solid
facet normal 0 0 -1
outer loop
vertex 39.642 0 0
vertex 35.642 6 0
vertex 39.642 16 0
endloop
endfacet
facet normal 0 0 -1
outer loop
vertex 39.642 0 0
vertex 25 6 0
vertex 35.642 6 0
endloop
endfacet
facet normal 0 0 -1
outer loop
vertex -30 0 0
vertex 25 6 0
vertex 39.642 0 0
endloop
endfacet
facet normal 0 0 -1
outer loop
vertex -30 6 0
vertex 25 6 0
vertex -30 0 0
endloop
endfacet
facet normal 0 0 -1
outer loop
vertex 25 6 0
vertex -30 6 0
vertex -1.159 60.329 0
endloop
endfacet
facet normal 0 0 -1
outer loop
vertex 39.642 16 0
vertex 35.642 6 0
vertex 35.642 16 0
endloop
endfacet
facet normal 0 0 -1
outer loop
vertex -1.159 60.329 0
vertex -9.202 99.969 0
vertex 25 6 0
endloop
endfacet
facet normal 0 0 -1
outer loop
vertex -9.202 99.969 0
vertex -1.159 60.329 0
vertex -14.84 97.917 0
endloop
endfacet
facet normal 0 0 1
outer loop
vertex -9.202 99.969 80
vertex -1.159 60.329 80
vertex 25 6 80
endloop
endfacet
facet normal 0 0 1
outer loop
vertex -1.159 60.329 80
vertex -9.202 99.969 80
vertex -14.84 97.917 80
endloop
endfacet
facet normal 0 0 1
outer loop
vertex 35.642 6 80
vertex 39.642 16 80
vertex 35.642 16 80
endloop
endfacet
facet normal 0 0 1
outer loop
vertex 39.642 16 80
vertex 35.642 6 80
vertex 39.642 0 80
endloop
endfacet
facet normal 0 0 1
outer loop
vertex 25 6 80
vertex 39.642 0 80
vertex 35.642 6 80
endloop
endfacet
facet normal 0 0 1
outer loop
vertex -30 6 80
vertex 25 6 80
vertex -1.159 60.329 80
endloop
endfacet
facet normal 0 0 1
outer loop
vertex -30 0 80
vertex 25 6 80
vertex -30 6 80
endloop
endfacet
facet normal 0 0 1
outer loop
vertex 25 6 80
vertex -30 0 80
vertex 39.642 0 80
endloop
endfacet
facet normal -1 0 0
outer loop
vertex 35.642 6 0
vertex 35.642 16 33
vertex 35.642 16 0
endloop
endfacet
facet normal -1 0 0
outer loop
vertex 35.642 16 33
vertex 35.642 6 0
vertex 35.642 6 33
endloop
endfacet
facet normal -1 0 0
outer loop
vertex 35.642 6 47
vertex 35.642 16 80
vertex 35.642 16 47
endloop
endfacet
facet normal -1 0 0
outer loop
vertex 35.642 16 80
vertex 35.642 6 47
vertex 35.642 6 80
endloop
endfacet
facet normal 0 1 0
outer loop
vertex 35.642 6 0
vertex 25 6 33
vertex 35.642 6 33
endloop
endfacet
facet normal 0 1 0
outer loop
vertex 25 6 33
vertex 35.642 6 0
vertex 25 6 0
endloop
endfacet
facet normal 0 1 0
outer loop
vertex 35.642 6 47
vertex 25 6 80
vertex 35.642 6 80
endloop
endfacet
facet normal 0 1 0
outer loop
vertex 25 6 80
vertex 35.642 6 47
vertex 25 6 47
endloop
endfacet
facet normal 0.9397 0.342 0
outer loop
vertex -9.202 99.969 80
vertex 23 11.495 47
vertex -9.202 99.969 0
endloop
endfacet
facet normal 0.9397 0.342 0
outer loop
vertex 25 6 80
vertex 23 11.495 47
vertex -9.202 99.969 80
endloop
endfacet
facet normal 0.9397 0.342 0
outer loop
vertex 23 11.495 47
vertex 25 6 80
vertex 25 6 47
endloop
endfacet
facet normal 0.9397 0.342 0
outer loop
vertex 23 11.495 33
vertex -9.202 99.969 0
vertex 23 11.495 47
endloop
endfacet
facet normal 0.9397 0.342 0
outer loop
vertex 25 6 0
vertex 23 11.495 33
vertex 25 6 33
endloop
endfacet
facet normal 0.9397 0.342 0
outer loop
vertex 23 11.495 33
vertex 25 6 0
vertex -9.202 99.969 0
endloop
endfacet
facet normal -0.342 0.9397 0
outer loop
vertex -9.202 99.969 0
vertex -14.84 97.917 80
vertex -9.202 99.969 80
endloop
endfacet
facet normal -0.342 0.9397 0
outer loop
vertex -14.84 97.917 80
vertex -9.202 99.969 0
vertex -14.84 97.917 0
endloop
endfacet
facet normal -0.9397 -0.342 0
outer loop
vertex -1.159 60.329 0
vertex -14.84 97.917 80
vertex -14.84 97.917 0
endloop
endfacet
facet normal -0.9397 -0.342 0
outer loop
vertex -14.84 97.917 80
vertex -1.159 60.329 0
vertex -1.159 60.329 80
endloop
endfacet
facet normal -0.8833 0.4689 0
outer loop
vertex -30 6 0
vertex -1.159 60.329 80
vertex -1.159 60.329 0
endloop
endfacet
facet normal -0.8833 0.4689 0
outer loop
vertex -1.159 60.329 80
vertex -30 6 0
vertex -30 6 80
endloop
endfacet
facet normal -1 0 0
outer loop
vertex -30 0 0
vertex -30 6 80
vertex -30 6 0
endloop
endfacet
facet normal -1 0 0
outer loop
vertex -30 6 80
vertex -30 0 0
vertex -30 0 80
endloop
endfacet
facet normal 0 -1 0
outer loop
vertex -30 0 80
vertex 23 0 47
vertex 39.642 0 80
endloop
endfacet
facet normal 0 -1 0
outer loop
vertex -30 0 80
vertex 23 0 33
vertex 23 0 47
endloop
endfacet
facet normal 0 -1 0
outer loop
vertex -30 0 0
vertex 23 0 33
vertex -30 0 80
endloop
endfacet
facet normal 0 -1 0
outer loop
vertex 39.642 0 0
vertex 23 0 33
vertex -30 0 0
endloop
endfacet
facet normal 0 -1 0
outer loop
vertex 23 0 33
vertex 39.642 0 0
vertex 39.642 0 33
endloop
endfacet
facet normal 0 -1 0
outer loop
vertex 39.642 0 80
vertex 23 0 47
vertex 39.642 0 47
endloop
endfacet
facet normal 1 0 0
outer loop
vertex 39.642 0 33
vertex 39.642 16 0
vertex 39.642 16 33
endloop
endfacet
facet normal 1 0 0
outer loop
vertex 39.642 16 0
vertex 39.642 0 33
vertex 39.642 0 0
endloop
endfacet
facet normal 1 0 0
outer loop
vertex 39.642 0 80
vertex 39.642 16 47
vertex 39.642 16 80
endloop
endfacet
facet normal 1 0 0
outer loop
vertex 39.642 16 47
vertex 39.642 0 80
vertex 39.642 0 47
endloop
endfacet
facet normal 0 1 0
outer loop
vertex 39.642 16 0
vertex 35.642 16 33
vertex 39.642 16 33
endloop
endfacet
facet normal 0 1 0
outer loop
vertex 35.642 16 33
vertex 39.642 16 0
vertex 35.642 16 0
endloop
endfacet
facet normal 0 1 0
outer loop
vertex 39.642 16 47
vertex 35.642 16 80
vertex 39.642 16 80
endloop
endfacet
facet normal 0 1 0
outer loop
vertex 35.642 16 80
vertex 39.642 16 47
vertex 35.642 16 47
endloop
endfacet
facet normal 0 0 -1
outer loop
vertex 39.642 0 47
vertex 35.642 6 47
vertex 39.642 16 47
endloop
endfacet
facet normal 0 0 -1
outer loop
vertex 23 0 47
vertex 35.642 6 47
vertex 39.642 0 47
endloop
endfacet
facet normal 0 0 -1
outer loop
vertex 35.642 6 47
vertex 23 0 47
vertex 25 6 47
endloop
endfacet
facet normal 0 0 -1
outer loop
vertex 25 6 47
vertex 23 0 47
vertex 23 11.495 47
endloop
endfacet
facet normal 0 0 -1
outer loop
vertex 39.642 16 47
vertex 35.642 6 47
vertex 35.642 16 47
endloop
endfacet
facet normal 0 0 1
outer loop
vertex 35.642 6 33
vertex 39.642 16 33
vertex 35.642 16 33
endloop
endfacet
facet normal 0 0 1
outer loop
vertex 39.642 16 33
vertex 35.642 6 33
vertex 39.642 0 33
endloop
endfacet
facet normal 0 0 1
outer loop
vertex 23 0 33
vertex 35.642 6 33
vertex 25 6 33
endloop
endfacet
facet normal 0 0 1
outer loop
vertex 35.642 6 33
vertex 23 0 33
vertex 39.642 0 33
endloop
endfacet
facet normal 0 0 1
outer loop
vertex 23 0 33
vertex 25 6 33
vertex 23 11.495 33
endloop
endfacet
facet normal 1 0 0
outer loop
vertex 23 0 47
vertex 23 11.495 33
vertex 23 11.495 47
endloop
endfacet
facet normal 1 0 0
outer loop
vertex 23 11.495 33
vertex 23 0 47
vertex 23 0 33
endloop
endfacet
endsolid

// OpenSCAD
// Phone stand: phone 9 mm thick in its case, leans back at 70 degrees, 80 mm wide,
// slot for a charging cable. Printed on its side: profile in XY, extruded by the width.
phone_t = 9;
angle = 70;            // back rest angle from the table
width = 80;
t = 6;                 // bar thickness
rest_len = 100;
base_t = 6;
lip_h = 10;
gap = 1;               // clearance in front of the phone
cable_w = 14;

ax = 25;                               // where the rest's front face meets the base top
u = [-cos(angle), sin(angle)];         // up the rest
nb = [-sin(angle), -cos(angle)];       // toward the back of the rest
A = [ax, base_t];
top = A + rest_len * u;
lip_x = ax + (phone_t + gap) / sin(angle);
back_x = -30;

module profile() {
    // base
    translate([back_x, 0]) square([lip_x + 4 - back_x, base_t]);
    // rest
    polygon([A, top, top + t * nb, A + t * nb]);
    // solid web between rest and base behind it
    polygon([A + t * nb, top + t * nb + 0.4 * rest_len * (-u), [back_x, base_t], [back_x, 0.1]]);
    // front lip
    translate([lip_x, 0]) square([4, base_t + lip_h]);
}

difference() {
    linear_extrude(width) profile();
    // cable slot through the lip and the base under the phone, centered on the width
    translate([ax - 2, -1, (width - cable_w) / 2]) cube([lip_x + 6 - ax + 2, base_t + lip_h + 2, cable_w]);
}
